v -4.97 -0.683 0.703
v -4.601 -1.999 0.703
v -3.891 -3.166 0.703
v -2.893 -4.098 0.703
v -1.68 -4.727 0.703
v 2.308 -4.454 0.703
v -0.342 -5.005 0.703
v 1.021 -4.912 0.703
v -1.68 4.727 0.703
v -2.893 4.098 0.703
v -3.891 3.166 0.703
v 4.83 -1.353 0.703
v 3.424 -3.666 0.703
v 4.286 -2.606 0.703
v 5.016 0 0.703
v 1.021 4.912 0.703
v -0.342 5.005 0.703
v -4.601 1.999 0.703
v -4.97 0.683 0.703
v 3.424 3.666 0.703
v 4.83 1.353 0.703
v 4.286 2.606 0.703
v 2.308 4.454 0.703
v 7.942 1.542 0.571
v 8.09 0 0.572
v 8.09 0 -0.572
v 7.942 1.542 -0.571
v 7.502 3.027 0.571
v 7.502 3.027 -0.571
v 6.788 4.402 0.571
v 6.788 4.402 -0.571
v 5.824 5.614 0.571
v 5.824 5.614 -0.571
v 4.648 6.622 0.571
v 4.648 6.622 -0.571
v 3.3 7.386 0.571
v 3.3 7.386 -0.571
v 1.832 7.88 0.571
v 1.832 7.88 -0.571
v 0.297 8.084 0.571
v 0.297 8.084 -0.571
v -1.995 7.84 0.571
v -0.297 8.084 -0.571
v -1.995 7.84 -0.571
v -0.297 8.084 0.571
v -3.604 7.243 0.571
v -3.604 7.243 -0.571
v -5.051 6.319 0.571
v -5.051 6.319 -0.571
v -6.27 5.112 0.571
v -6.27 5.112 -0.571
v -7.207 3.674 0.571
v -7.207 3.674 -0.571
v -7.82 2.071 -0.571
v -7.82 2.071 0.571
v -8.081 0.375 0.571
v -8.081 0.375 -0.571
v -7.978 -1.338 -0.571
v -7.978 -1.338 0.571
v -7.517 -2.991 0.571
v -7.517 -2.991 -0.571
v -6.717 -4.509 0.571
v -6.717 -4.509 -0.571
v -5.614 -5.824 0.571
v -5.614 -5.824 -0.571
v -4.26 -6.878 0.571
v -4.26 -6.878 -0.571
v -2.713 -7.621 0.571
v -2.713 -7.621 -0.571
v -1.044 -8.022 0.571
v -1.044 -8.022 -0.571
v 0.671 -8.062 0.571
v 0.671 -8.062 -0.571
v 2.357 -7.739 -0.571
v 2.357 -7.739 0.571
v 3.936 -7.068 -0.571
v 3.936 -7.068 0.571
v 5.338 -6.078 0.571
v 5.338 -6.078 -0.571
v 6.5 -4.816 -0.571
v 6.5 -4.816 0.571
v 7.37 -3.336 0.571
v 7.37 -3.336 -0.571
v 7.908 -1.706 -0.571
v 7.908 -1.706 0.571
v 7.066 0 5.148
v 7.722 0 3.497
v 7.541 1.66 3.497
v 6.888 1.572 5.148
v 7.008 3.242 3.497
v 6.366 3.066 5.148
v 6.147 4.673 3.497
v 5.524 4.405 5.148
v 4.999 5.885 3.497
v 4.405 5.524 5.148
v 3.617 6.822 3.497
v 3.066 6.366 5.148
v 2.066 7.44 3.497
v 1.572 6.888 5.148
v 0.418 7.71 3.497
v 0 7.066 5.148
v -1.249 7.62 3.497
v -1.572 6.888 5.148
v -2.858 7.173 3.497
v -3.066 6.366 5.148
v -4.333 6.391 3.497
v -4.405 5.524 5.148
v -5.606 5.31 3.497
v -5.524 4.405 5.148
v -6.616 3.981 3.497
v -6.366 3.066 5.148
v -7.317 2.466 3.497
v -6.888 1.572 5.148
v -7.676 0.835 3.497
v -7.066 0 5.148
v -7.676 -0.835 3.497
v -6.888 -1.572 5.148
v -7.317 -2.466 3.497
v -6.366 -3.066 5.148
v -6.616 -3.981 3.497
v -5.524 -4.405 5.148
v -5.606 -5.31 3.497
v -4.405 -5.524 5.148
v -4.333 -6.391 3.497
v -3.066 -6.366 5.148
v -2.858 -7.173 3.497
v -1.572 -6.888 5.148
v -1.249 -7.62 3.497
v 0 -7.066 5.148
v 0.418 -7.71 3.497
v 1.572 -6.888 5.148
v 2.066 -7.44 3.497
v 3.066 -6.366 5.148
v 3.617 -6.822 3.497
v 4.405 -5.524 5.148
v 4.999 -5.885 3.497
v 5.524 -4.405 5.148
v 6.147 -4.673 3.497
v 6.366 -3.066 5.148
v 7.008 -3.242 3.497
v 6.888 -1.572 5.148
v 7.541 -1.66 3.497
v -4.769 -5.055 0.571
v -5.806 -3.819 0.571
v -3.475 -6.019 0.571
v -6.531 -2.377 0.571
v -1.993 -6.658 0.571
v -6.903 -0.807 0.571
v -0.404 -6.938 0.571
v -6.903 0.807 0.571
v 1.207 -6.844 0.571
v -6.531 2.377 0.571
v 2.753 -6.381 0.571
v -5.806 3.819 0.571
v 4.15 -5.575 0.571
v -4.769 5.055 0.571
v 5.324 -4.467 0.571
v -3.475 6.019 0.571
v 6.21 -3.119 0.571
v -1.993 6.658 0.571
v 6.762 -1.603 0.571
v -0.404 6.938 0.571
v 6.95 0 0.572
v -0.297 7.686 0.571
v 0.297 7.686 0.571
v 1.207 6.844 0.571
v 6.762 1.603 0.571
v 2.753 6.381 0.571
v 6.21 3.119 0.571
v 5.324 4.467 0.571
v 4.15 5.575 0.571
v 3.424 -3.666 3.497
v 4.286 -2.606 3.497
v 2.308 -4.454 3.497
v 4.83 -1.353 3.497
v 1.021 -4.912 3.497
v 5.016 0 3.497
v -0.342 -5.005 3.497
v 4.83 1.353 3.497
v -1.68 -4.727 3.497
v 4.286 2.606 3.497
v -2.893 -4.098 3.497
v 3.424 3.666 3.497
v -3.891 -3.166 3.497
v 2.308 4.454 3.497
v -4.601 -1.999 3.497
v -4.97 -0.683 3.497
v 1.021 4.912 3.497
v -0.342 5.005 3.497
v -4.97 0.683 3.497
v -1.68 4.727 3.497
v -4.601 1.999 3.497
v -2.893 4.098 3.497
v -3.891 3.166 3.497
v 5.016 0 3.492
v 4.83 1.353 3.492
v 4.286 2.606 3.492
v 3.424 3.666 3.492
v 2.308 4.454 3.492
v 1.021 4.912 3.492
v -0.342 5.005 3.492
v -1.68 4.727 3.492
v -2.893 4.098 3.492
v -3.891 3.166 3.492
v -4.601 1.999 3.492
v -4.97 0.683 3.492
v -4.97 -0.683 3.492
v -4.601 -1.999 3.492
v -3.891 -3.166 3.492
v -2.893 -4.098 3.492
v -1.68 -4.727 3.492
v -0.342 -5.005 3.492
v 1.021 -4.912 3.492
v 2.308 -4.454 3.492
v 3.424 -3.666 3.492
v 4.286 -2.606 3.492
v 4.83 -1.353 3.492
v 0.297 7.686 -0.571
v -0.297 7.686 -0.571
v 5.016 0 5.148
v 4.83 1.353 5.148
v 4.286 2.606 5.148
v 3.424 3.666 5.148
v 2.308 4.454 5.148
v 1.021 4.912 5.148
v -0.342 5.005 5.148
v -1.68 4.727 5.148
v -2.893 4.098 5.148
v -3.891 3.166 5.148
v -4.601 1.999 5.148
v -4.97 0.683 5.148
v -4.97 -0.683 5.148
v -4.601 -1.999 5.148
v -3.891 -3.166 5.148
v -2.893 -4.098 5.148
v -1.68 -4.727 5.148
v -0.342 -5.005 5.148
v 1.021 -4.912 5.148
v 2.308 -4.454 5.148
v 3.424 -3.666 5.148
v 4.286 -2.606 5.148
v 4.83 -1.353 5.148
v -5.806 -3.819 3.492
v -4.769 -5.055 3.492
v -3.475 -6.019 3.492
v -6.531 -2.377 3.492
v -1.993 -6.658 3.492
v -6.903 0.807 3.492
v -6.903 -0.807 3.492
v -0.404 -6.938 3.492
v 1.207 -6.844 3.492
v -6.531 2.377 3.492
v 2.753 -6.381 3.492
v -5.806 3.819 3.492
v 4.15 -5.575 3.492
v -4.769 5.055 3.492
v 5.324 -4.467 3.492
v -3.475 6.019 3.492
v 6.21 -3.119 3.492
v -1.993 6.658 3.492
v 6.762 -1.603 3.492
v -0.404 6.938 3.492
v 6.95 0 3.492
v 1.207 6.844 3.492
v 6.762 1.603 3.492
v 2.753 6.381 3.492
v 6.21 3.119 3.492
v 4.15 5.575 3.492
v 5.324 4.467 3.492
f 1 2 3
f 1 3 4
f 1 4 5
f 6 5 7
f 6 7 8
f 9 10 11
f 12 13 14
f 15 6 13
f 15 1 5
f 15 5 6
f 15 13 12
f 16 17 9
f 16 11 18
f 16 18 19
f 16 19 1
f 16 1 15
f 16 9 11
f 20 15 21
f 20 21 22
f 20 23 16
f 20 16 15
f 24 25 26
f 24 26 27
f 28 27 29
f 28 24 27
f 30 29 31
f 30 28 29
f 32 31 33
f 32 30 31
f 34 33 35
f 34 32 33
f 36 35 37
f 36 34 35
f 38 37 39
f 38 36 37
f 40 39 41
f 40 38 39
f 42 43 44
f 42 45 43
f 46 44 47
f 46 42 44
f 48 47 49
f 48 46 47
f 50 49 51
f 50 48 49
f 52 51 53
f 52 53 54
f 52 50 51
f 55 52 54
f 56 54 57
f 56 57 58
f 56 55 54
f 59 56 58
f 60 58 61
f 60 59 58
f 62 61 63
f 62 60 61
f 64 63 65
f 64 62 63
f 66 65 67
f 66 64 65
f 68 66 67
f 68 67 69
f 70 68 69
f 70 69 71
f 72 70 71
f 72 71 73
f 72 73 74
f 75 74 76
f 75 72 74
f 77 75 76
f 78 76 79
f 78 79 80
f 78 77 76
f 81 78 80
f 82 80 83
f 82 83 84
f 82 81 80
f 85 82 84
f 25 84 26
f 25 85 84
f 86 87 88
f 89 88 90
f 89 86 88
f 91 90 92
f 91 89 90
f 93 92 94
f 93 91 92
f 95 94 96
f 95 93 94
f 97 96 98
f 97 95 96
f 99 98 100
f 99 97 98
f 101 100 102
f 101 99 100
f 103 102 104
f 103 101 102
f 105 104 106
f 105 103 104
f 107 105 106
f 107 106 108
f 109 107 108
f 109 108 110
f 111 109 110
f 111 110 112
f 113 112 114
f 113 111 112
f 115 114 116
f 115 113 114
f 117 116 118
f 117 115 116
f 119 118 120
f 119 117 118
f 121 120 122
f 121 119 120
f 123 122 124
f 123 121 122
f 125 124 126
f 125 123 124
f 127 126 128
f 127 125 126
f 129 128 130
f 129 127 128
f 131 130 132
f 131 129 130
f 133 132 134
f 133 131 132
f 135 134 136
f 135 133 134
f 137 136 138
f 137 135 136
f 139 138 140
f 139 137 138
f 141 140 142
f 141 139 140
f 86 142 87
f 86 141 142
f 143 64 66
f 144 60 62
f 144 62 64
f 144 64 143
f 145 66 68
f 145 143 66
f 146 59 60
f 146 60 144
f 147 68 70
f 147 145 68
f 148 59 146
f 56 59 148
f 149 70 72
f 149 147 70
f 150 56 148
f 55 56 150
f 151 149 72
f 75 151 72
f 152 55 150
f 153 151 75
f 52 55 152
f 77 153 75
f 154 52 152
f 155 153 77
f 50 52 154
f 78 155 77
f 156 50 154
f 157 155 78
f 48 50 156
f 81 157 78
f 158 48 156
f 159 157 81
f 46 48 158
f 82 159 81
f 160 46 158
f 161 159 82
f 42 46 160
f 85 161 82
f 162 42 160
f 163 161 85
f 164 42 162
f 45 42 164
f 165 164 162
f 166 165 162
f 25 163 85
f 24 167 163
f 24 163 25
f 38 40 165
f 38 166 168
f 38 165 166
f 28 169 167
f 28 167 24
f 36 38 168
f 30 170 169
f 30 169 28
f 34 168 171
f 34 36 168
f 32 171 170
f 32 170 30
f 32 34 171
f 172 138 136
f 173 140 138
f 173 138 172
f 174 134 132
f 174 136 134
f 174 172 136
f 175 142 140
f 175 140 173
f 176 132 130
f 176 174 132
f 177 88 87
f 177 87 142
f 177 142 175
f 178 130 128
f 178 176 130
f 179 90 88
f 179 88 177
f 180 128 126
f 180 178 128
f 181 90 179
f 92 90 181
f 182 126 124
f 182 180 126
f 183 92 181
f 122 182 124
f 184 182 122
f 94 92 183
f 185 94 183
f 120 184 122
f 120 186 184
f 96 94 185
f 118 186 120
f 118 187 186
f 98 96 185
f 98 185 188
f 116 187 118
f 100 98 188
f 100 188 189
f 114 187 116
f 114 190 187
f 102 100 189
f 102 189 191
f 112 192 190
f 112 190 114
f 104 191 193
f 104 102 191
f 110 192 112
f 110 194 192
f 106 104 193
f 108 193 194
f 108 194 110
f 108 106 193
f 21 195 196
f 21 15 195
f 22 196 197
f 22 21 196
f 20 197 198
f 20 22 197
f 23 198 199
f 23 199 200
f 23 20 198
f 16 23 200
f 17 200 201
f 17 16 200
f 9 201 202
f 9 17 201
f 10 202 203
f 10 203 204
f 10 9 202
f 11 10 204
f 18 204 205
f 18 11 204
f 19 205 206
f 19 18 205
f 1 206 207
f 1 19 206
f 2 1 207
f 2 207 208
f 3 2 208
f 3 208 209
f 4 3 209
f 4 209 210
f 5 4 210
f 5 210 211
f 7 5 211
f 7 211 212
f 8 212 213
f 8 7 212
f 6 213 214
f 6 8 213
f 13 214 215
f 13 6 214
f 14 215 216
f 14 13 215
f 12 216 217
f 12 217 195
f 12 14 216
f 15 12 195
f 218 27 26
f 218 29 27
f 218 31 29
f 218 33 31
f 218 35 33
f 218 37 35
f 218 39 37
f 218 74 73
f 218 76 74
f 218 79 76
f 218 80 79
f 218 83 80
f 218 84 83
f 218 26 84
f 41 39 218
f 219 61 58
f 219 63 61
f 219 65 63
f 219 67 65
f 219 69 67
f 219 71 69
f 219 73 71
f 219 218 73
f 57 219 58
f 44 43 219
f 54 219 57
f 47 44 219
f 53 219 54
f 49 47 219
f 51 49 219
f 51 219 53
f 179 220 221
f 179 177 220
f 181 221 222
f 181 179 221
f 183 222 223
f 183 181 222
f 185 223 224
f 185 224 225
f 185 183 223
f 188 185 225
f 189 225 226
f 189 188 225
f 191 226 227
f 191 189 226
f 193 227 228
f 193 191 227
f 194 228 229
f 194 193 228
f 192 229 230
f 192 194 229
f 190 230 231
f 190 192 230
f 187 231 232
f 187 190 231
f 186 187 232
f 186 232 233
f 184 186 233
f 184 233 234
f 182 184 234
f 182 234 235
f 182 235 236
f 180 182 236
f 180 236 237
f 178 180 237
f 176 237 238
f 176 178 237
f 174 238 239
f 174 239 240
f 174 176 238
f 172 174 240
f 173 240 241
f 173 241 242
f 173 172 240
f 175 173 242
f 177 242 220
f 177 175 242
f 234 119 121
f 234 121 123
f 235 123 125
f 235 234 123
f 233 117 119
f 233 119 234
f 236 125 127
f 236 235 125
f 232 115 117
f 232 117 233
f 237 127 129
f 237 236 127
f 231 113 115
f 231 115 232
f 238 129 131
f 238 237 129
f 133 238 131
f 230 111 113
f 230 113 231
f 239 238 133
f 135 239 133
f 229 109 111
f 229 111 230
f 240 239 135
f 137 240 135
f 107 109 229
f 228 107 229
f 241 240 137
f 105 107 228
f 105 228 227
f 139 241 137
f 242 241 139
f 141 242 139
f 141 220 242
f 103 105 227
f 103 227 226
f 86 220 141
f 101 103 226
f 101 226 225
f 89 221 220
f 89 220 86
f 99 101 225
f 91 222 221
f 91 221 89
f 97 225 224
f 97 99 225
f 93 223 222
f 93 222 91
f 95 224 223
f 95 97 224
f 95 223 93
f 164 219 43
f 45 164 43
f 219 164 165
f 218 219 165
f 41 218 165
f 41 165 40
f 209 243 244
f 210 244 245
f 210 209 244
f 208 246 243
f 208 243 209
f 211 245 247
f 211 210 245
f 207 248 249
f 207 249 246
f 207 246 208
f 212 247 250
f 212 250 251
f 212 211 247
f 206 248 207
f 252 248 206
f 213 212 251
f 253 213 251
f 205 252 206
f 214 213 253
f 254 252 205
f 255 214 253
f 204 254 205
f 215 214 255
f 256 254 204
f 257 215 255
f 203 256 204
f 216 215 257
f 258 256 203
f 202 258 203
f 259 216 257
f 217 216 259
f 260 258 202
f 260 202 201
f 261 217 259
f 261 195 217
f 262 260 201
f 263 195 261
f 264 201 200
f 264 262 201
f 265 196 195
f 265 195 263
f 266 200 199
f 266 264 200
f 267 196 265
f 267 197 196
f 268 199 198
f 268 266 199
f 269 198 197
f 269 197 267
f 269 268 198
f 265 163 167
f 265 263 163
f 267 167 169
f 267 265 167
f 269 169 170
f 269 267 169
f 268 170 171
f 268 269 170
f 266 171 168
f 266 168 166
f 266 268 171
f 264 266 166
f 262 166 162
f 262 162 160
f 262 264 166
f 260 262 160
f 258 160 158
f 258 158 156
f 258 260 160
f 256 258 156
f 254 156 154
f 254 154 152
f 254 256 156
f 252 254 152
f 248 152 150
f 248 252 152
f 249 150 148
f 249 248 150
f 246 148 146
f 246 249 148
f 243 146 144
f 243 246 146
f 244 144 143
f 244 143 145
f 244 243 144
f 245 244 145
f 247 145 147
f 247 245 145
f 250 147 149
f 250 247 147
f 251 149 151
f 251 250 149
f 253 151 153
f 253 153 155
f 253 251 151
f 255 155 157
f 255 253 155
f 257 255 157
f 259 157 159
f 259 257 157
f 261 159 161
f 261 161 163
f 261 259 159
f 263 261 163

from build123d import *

# Parameters (mm, degrees)
F0_W     = 5.0165
F0_H     = 2.7894913001
F3_W     = 0.5937354872
F3_H     = 0.4102843814
F4_DEPTH = 3.175


with BuildPart() as f1:
    # F0 (on Front) → F1 (revolve)
    with BuildSketch(Plane.XZ):
        Polygon((5.0165, 5.1480086999), (5.0165, 3.4970086999), (7.721603642, 3.4970086999), (7.0656258613, 5.1480086999), align=None)
    revolve(axis=Axis((0, 0, 2.28825435), (0, 0, 1)))

    # F0 (on Front) → F2 (revolve, cut)
    with BuildSketch(Plane.XZ):
        with Locations((-2.50825, 2.09775435)):
            Rectangle(F0_W, F0_H)
    revolve(axis=Axis((0, 0, 2.28825435), (0, 0, 1)), mode=Mode.SUBTRACT)


with BuildPart() as f1b:
    # F0 (on Front) → F1, piece 2 (revolve)
    with BuildSketch(Plane.XZ):
        Polygon((0, 0.7030086999), (0, 0.5715), (6.9496983094, 0.5715), (6.9496983094, 3.4925), (5.0165, 3.4925), (5.0165, 0.7030086999), align=None)
        Polygon((0, 0.5715), (0, -0.5715), (8.0899, -0.5715), (8.0899, 0.5715), (6.9496983094, 0.5715), align=None)
    revolve(axis=Axis((0, 0, 2.28825435), (0, 0, 1)))

    # F3 (on Top) → F4 (cut, symmetric)
    with BuildSketch(Plane.XY):
        with Locations((0, 7.8913413454)):
            Rectangle(F3_W, F3_H)
    extrude(amount=F4_DEPTH, both=True, mode=Mode.SUBTRACT)


solid = Compound([f1.part, f1b.part])
